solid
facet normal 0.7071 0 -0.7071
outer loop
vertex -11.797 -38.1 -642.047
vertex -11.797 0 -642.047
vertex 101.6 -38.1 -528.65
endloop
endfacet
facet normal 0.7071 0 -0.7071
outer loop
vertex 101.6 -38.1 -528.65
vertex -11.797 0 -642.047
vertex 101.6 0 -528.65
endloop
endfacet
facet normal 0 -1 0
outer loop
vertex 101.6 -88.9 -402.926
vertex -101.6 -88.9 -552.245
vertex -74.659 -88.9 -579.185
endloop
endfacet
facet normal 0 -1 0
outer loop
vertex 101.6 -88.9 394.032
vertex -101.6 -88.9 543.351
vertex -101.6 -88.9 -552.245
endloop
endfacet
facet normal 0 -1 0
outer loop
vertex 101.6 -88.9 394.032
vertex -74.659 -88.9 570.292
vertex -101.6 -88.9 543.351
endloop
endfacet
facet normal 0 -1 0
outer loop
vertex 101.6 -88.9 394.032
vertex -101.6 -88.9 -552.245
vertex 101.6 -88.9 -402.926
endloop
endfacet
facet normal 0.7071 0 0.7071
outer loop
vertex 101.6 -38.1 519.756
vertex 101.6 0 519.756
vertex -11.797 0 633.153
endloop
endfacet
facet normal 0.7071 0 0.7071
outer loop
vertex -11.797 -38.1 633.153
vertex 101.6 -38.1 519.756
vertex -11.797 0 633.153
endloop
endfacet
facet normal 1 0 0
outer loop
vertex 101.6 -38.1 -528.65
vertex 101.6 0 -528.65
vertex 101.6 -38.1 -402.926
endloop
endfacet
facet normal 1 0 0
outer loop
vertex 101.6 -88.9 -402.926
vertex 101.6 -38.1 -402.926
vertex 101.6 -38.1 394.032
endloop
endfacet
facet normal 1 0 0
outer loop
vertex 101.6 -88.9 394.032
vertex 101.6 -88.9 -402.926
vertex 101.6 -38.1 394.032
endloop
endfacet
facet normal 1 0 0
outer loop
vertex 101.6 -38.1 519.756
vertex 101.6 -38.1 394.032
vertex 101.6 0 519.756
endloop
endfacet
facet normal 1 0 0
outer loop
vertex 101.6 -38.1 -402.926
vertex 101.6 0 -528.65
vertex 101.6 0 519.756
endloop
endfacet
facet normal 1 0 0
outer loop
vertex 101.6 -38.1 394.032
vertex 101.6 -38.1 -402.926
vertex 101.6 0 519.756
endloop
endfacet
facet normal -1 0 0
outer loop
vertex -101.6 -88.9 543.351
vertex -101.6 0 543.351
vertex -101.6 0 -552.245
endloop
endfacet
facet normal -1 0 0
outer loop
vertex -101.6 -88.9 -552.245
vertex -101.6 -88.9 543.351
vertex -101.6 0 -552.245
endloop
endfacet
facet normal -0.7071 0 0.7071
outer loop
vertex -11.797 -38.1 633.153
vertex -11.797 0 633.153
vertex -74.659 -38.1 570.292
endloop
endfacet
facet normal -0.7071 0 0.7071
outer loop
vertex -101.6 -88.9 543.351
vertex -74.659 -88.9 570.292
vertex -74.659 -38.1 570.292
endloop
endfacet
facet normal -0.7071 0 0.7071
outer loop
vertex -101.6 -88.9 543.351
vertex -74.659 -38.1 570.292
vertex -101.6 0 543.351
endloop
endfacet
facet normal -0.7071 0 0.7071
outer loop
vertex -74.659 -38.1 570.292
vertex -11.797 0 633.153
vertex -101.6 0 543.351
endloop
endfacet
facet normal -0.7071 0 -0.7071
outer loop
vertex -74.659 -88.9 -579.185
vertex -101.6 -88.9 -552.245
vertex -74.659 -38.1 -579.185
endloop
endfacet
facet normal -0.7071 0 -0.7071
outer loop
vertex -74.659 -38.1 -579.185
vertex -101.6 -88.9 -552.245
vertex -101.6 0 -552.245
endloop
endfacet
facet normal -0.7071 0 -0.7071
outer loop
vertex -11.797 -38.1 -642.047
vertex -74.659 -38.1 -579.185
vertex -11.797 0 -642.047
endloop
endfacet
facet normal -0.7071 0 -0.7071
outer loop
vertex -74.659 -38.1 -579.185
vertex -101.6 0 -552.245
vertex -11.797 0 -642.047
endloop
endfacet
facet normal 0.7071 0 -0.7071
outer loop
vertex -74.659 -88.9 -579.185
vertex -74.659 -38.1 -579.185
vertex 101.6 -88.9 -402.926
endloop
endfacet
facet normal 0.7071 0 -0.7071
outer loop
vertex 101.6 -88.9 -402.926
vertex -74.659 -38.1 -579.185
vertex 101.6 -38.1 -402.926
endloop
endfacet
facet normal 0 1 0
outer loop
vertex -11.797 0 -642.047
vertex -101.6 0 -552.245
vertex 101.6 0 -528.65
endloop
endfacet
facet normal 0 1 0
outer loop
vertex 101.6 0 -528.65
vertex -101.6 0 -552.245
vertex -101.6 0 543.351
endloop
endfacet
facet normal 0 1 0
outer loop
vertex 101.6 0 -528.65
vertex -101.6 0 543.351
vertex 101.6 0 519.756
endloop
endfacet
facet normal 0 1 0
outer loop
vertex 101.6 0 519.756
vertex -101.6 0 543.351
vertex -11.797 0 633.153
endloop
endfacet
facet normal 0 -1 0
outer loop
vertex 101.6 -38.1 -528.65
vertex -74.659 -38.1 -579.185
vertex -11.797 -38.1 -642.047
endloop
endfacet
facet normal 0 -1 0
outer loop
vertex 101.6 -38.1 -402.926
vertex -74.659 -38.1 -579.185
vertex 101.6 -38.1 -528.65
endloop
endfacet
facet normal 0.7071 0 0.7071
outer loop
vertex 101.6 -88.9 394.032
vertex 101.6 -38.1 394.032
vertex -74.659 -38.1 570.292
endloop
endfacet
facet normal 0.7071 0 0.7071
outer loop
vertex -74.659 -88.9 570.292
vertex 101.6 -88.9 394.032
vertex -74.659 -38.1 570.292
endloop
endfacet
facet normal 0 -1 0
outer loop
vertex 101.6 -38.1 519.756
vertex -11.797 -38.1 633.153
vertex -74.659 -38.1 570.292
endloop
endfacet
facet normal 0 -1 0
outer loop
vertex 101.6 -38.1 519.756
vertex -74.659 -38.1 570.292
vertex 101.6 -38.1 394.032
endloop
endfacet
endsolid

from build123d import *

# Parameters (mm, degrees)
F1_DEPTH = 88.9
F2_DEPTH = 38.1


with BuildPart() as f1:
    # F0 (on Front) → F1 (new body)
    with BuildSketch(Plane.XZ):
        Polygon((101.6, 340.150816), (-101.6, 543.350816), (-101.6, -552.244648), (101.6, -349.044648), align=None)
        Polygon((101.6, -349.044648), (-101.6, -552.244648), (-74.659232, -579.185416), (101.6, -402.926184), align=None)
        Polygon((-74.659232, 570.291584), (-101.6, 543.350816), (101.6, 340.150816), (101.6, 394.032352), align=None)
    extrude(amount=F1_DEPTH)

    # F0 (on Front) → F2 (join)
    with BuildSketch(Plane.XZ):
        Polygon((101.6, 394.032352), (101.6, 519.755938), (-11.797439, 633.153377), (-74.659232, 570.291584), align=None)
        Polygon((101.6, -402.926184), (-74.659232, -579.185416), (-11.797439, -642.047209), (101.6, -528.64977), align=None)
    extrude(amount=F2_DEPTH)


solid = f1.part
